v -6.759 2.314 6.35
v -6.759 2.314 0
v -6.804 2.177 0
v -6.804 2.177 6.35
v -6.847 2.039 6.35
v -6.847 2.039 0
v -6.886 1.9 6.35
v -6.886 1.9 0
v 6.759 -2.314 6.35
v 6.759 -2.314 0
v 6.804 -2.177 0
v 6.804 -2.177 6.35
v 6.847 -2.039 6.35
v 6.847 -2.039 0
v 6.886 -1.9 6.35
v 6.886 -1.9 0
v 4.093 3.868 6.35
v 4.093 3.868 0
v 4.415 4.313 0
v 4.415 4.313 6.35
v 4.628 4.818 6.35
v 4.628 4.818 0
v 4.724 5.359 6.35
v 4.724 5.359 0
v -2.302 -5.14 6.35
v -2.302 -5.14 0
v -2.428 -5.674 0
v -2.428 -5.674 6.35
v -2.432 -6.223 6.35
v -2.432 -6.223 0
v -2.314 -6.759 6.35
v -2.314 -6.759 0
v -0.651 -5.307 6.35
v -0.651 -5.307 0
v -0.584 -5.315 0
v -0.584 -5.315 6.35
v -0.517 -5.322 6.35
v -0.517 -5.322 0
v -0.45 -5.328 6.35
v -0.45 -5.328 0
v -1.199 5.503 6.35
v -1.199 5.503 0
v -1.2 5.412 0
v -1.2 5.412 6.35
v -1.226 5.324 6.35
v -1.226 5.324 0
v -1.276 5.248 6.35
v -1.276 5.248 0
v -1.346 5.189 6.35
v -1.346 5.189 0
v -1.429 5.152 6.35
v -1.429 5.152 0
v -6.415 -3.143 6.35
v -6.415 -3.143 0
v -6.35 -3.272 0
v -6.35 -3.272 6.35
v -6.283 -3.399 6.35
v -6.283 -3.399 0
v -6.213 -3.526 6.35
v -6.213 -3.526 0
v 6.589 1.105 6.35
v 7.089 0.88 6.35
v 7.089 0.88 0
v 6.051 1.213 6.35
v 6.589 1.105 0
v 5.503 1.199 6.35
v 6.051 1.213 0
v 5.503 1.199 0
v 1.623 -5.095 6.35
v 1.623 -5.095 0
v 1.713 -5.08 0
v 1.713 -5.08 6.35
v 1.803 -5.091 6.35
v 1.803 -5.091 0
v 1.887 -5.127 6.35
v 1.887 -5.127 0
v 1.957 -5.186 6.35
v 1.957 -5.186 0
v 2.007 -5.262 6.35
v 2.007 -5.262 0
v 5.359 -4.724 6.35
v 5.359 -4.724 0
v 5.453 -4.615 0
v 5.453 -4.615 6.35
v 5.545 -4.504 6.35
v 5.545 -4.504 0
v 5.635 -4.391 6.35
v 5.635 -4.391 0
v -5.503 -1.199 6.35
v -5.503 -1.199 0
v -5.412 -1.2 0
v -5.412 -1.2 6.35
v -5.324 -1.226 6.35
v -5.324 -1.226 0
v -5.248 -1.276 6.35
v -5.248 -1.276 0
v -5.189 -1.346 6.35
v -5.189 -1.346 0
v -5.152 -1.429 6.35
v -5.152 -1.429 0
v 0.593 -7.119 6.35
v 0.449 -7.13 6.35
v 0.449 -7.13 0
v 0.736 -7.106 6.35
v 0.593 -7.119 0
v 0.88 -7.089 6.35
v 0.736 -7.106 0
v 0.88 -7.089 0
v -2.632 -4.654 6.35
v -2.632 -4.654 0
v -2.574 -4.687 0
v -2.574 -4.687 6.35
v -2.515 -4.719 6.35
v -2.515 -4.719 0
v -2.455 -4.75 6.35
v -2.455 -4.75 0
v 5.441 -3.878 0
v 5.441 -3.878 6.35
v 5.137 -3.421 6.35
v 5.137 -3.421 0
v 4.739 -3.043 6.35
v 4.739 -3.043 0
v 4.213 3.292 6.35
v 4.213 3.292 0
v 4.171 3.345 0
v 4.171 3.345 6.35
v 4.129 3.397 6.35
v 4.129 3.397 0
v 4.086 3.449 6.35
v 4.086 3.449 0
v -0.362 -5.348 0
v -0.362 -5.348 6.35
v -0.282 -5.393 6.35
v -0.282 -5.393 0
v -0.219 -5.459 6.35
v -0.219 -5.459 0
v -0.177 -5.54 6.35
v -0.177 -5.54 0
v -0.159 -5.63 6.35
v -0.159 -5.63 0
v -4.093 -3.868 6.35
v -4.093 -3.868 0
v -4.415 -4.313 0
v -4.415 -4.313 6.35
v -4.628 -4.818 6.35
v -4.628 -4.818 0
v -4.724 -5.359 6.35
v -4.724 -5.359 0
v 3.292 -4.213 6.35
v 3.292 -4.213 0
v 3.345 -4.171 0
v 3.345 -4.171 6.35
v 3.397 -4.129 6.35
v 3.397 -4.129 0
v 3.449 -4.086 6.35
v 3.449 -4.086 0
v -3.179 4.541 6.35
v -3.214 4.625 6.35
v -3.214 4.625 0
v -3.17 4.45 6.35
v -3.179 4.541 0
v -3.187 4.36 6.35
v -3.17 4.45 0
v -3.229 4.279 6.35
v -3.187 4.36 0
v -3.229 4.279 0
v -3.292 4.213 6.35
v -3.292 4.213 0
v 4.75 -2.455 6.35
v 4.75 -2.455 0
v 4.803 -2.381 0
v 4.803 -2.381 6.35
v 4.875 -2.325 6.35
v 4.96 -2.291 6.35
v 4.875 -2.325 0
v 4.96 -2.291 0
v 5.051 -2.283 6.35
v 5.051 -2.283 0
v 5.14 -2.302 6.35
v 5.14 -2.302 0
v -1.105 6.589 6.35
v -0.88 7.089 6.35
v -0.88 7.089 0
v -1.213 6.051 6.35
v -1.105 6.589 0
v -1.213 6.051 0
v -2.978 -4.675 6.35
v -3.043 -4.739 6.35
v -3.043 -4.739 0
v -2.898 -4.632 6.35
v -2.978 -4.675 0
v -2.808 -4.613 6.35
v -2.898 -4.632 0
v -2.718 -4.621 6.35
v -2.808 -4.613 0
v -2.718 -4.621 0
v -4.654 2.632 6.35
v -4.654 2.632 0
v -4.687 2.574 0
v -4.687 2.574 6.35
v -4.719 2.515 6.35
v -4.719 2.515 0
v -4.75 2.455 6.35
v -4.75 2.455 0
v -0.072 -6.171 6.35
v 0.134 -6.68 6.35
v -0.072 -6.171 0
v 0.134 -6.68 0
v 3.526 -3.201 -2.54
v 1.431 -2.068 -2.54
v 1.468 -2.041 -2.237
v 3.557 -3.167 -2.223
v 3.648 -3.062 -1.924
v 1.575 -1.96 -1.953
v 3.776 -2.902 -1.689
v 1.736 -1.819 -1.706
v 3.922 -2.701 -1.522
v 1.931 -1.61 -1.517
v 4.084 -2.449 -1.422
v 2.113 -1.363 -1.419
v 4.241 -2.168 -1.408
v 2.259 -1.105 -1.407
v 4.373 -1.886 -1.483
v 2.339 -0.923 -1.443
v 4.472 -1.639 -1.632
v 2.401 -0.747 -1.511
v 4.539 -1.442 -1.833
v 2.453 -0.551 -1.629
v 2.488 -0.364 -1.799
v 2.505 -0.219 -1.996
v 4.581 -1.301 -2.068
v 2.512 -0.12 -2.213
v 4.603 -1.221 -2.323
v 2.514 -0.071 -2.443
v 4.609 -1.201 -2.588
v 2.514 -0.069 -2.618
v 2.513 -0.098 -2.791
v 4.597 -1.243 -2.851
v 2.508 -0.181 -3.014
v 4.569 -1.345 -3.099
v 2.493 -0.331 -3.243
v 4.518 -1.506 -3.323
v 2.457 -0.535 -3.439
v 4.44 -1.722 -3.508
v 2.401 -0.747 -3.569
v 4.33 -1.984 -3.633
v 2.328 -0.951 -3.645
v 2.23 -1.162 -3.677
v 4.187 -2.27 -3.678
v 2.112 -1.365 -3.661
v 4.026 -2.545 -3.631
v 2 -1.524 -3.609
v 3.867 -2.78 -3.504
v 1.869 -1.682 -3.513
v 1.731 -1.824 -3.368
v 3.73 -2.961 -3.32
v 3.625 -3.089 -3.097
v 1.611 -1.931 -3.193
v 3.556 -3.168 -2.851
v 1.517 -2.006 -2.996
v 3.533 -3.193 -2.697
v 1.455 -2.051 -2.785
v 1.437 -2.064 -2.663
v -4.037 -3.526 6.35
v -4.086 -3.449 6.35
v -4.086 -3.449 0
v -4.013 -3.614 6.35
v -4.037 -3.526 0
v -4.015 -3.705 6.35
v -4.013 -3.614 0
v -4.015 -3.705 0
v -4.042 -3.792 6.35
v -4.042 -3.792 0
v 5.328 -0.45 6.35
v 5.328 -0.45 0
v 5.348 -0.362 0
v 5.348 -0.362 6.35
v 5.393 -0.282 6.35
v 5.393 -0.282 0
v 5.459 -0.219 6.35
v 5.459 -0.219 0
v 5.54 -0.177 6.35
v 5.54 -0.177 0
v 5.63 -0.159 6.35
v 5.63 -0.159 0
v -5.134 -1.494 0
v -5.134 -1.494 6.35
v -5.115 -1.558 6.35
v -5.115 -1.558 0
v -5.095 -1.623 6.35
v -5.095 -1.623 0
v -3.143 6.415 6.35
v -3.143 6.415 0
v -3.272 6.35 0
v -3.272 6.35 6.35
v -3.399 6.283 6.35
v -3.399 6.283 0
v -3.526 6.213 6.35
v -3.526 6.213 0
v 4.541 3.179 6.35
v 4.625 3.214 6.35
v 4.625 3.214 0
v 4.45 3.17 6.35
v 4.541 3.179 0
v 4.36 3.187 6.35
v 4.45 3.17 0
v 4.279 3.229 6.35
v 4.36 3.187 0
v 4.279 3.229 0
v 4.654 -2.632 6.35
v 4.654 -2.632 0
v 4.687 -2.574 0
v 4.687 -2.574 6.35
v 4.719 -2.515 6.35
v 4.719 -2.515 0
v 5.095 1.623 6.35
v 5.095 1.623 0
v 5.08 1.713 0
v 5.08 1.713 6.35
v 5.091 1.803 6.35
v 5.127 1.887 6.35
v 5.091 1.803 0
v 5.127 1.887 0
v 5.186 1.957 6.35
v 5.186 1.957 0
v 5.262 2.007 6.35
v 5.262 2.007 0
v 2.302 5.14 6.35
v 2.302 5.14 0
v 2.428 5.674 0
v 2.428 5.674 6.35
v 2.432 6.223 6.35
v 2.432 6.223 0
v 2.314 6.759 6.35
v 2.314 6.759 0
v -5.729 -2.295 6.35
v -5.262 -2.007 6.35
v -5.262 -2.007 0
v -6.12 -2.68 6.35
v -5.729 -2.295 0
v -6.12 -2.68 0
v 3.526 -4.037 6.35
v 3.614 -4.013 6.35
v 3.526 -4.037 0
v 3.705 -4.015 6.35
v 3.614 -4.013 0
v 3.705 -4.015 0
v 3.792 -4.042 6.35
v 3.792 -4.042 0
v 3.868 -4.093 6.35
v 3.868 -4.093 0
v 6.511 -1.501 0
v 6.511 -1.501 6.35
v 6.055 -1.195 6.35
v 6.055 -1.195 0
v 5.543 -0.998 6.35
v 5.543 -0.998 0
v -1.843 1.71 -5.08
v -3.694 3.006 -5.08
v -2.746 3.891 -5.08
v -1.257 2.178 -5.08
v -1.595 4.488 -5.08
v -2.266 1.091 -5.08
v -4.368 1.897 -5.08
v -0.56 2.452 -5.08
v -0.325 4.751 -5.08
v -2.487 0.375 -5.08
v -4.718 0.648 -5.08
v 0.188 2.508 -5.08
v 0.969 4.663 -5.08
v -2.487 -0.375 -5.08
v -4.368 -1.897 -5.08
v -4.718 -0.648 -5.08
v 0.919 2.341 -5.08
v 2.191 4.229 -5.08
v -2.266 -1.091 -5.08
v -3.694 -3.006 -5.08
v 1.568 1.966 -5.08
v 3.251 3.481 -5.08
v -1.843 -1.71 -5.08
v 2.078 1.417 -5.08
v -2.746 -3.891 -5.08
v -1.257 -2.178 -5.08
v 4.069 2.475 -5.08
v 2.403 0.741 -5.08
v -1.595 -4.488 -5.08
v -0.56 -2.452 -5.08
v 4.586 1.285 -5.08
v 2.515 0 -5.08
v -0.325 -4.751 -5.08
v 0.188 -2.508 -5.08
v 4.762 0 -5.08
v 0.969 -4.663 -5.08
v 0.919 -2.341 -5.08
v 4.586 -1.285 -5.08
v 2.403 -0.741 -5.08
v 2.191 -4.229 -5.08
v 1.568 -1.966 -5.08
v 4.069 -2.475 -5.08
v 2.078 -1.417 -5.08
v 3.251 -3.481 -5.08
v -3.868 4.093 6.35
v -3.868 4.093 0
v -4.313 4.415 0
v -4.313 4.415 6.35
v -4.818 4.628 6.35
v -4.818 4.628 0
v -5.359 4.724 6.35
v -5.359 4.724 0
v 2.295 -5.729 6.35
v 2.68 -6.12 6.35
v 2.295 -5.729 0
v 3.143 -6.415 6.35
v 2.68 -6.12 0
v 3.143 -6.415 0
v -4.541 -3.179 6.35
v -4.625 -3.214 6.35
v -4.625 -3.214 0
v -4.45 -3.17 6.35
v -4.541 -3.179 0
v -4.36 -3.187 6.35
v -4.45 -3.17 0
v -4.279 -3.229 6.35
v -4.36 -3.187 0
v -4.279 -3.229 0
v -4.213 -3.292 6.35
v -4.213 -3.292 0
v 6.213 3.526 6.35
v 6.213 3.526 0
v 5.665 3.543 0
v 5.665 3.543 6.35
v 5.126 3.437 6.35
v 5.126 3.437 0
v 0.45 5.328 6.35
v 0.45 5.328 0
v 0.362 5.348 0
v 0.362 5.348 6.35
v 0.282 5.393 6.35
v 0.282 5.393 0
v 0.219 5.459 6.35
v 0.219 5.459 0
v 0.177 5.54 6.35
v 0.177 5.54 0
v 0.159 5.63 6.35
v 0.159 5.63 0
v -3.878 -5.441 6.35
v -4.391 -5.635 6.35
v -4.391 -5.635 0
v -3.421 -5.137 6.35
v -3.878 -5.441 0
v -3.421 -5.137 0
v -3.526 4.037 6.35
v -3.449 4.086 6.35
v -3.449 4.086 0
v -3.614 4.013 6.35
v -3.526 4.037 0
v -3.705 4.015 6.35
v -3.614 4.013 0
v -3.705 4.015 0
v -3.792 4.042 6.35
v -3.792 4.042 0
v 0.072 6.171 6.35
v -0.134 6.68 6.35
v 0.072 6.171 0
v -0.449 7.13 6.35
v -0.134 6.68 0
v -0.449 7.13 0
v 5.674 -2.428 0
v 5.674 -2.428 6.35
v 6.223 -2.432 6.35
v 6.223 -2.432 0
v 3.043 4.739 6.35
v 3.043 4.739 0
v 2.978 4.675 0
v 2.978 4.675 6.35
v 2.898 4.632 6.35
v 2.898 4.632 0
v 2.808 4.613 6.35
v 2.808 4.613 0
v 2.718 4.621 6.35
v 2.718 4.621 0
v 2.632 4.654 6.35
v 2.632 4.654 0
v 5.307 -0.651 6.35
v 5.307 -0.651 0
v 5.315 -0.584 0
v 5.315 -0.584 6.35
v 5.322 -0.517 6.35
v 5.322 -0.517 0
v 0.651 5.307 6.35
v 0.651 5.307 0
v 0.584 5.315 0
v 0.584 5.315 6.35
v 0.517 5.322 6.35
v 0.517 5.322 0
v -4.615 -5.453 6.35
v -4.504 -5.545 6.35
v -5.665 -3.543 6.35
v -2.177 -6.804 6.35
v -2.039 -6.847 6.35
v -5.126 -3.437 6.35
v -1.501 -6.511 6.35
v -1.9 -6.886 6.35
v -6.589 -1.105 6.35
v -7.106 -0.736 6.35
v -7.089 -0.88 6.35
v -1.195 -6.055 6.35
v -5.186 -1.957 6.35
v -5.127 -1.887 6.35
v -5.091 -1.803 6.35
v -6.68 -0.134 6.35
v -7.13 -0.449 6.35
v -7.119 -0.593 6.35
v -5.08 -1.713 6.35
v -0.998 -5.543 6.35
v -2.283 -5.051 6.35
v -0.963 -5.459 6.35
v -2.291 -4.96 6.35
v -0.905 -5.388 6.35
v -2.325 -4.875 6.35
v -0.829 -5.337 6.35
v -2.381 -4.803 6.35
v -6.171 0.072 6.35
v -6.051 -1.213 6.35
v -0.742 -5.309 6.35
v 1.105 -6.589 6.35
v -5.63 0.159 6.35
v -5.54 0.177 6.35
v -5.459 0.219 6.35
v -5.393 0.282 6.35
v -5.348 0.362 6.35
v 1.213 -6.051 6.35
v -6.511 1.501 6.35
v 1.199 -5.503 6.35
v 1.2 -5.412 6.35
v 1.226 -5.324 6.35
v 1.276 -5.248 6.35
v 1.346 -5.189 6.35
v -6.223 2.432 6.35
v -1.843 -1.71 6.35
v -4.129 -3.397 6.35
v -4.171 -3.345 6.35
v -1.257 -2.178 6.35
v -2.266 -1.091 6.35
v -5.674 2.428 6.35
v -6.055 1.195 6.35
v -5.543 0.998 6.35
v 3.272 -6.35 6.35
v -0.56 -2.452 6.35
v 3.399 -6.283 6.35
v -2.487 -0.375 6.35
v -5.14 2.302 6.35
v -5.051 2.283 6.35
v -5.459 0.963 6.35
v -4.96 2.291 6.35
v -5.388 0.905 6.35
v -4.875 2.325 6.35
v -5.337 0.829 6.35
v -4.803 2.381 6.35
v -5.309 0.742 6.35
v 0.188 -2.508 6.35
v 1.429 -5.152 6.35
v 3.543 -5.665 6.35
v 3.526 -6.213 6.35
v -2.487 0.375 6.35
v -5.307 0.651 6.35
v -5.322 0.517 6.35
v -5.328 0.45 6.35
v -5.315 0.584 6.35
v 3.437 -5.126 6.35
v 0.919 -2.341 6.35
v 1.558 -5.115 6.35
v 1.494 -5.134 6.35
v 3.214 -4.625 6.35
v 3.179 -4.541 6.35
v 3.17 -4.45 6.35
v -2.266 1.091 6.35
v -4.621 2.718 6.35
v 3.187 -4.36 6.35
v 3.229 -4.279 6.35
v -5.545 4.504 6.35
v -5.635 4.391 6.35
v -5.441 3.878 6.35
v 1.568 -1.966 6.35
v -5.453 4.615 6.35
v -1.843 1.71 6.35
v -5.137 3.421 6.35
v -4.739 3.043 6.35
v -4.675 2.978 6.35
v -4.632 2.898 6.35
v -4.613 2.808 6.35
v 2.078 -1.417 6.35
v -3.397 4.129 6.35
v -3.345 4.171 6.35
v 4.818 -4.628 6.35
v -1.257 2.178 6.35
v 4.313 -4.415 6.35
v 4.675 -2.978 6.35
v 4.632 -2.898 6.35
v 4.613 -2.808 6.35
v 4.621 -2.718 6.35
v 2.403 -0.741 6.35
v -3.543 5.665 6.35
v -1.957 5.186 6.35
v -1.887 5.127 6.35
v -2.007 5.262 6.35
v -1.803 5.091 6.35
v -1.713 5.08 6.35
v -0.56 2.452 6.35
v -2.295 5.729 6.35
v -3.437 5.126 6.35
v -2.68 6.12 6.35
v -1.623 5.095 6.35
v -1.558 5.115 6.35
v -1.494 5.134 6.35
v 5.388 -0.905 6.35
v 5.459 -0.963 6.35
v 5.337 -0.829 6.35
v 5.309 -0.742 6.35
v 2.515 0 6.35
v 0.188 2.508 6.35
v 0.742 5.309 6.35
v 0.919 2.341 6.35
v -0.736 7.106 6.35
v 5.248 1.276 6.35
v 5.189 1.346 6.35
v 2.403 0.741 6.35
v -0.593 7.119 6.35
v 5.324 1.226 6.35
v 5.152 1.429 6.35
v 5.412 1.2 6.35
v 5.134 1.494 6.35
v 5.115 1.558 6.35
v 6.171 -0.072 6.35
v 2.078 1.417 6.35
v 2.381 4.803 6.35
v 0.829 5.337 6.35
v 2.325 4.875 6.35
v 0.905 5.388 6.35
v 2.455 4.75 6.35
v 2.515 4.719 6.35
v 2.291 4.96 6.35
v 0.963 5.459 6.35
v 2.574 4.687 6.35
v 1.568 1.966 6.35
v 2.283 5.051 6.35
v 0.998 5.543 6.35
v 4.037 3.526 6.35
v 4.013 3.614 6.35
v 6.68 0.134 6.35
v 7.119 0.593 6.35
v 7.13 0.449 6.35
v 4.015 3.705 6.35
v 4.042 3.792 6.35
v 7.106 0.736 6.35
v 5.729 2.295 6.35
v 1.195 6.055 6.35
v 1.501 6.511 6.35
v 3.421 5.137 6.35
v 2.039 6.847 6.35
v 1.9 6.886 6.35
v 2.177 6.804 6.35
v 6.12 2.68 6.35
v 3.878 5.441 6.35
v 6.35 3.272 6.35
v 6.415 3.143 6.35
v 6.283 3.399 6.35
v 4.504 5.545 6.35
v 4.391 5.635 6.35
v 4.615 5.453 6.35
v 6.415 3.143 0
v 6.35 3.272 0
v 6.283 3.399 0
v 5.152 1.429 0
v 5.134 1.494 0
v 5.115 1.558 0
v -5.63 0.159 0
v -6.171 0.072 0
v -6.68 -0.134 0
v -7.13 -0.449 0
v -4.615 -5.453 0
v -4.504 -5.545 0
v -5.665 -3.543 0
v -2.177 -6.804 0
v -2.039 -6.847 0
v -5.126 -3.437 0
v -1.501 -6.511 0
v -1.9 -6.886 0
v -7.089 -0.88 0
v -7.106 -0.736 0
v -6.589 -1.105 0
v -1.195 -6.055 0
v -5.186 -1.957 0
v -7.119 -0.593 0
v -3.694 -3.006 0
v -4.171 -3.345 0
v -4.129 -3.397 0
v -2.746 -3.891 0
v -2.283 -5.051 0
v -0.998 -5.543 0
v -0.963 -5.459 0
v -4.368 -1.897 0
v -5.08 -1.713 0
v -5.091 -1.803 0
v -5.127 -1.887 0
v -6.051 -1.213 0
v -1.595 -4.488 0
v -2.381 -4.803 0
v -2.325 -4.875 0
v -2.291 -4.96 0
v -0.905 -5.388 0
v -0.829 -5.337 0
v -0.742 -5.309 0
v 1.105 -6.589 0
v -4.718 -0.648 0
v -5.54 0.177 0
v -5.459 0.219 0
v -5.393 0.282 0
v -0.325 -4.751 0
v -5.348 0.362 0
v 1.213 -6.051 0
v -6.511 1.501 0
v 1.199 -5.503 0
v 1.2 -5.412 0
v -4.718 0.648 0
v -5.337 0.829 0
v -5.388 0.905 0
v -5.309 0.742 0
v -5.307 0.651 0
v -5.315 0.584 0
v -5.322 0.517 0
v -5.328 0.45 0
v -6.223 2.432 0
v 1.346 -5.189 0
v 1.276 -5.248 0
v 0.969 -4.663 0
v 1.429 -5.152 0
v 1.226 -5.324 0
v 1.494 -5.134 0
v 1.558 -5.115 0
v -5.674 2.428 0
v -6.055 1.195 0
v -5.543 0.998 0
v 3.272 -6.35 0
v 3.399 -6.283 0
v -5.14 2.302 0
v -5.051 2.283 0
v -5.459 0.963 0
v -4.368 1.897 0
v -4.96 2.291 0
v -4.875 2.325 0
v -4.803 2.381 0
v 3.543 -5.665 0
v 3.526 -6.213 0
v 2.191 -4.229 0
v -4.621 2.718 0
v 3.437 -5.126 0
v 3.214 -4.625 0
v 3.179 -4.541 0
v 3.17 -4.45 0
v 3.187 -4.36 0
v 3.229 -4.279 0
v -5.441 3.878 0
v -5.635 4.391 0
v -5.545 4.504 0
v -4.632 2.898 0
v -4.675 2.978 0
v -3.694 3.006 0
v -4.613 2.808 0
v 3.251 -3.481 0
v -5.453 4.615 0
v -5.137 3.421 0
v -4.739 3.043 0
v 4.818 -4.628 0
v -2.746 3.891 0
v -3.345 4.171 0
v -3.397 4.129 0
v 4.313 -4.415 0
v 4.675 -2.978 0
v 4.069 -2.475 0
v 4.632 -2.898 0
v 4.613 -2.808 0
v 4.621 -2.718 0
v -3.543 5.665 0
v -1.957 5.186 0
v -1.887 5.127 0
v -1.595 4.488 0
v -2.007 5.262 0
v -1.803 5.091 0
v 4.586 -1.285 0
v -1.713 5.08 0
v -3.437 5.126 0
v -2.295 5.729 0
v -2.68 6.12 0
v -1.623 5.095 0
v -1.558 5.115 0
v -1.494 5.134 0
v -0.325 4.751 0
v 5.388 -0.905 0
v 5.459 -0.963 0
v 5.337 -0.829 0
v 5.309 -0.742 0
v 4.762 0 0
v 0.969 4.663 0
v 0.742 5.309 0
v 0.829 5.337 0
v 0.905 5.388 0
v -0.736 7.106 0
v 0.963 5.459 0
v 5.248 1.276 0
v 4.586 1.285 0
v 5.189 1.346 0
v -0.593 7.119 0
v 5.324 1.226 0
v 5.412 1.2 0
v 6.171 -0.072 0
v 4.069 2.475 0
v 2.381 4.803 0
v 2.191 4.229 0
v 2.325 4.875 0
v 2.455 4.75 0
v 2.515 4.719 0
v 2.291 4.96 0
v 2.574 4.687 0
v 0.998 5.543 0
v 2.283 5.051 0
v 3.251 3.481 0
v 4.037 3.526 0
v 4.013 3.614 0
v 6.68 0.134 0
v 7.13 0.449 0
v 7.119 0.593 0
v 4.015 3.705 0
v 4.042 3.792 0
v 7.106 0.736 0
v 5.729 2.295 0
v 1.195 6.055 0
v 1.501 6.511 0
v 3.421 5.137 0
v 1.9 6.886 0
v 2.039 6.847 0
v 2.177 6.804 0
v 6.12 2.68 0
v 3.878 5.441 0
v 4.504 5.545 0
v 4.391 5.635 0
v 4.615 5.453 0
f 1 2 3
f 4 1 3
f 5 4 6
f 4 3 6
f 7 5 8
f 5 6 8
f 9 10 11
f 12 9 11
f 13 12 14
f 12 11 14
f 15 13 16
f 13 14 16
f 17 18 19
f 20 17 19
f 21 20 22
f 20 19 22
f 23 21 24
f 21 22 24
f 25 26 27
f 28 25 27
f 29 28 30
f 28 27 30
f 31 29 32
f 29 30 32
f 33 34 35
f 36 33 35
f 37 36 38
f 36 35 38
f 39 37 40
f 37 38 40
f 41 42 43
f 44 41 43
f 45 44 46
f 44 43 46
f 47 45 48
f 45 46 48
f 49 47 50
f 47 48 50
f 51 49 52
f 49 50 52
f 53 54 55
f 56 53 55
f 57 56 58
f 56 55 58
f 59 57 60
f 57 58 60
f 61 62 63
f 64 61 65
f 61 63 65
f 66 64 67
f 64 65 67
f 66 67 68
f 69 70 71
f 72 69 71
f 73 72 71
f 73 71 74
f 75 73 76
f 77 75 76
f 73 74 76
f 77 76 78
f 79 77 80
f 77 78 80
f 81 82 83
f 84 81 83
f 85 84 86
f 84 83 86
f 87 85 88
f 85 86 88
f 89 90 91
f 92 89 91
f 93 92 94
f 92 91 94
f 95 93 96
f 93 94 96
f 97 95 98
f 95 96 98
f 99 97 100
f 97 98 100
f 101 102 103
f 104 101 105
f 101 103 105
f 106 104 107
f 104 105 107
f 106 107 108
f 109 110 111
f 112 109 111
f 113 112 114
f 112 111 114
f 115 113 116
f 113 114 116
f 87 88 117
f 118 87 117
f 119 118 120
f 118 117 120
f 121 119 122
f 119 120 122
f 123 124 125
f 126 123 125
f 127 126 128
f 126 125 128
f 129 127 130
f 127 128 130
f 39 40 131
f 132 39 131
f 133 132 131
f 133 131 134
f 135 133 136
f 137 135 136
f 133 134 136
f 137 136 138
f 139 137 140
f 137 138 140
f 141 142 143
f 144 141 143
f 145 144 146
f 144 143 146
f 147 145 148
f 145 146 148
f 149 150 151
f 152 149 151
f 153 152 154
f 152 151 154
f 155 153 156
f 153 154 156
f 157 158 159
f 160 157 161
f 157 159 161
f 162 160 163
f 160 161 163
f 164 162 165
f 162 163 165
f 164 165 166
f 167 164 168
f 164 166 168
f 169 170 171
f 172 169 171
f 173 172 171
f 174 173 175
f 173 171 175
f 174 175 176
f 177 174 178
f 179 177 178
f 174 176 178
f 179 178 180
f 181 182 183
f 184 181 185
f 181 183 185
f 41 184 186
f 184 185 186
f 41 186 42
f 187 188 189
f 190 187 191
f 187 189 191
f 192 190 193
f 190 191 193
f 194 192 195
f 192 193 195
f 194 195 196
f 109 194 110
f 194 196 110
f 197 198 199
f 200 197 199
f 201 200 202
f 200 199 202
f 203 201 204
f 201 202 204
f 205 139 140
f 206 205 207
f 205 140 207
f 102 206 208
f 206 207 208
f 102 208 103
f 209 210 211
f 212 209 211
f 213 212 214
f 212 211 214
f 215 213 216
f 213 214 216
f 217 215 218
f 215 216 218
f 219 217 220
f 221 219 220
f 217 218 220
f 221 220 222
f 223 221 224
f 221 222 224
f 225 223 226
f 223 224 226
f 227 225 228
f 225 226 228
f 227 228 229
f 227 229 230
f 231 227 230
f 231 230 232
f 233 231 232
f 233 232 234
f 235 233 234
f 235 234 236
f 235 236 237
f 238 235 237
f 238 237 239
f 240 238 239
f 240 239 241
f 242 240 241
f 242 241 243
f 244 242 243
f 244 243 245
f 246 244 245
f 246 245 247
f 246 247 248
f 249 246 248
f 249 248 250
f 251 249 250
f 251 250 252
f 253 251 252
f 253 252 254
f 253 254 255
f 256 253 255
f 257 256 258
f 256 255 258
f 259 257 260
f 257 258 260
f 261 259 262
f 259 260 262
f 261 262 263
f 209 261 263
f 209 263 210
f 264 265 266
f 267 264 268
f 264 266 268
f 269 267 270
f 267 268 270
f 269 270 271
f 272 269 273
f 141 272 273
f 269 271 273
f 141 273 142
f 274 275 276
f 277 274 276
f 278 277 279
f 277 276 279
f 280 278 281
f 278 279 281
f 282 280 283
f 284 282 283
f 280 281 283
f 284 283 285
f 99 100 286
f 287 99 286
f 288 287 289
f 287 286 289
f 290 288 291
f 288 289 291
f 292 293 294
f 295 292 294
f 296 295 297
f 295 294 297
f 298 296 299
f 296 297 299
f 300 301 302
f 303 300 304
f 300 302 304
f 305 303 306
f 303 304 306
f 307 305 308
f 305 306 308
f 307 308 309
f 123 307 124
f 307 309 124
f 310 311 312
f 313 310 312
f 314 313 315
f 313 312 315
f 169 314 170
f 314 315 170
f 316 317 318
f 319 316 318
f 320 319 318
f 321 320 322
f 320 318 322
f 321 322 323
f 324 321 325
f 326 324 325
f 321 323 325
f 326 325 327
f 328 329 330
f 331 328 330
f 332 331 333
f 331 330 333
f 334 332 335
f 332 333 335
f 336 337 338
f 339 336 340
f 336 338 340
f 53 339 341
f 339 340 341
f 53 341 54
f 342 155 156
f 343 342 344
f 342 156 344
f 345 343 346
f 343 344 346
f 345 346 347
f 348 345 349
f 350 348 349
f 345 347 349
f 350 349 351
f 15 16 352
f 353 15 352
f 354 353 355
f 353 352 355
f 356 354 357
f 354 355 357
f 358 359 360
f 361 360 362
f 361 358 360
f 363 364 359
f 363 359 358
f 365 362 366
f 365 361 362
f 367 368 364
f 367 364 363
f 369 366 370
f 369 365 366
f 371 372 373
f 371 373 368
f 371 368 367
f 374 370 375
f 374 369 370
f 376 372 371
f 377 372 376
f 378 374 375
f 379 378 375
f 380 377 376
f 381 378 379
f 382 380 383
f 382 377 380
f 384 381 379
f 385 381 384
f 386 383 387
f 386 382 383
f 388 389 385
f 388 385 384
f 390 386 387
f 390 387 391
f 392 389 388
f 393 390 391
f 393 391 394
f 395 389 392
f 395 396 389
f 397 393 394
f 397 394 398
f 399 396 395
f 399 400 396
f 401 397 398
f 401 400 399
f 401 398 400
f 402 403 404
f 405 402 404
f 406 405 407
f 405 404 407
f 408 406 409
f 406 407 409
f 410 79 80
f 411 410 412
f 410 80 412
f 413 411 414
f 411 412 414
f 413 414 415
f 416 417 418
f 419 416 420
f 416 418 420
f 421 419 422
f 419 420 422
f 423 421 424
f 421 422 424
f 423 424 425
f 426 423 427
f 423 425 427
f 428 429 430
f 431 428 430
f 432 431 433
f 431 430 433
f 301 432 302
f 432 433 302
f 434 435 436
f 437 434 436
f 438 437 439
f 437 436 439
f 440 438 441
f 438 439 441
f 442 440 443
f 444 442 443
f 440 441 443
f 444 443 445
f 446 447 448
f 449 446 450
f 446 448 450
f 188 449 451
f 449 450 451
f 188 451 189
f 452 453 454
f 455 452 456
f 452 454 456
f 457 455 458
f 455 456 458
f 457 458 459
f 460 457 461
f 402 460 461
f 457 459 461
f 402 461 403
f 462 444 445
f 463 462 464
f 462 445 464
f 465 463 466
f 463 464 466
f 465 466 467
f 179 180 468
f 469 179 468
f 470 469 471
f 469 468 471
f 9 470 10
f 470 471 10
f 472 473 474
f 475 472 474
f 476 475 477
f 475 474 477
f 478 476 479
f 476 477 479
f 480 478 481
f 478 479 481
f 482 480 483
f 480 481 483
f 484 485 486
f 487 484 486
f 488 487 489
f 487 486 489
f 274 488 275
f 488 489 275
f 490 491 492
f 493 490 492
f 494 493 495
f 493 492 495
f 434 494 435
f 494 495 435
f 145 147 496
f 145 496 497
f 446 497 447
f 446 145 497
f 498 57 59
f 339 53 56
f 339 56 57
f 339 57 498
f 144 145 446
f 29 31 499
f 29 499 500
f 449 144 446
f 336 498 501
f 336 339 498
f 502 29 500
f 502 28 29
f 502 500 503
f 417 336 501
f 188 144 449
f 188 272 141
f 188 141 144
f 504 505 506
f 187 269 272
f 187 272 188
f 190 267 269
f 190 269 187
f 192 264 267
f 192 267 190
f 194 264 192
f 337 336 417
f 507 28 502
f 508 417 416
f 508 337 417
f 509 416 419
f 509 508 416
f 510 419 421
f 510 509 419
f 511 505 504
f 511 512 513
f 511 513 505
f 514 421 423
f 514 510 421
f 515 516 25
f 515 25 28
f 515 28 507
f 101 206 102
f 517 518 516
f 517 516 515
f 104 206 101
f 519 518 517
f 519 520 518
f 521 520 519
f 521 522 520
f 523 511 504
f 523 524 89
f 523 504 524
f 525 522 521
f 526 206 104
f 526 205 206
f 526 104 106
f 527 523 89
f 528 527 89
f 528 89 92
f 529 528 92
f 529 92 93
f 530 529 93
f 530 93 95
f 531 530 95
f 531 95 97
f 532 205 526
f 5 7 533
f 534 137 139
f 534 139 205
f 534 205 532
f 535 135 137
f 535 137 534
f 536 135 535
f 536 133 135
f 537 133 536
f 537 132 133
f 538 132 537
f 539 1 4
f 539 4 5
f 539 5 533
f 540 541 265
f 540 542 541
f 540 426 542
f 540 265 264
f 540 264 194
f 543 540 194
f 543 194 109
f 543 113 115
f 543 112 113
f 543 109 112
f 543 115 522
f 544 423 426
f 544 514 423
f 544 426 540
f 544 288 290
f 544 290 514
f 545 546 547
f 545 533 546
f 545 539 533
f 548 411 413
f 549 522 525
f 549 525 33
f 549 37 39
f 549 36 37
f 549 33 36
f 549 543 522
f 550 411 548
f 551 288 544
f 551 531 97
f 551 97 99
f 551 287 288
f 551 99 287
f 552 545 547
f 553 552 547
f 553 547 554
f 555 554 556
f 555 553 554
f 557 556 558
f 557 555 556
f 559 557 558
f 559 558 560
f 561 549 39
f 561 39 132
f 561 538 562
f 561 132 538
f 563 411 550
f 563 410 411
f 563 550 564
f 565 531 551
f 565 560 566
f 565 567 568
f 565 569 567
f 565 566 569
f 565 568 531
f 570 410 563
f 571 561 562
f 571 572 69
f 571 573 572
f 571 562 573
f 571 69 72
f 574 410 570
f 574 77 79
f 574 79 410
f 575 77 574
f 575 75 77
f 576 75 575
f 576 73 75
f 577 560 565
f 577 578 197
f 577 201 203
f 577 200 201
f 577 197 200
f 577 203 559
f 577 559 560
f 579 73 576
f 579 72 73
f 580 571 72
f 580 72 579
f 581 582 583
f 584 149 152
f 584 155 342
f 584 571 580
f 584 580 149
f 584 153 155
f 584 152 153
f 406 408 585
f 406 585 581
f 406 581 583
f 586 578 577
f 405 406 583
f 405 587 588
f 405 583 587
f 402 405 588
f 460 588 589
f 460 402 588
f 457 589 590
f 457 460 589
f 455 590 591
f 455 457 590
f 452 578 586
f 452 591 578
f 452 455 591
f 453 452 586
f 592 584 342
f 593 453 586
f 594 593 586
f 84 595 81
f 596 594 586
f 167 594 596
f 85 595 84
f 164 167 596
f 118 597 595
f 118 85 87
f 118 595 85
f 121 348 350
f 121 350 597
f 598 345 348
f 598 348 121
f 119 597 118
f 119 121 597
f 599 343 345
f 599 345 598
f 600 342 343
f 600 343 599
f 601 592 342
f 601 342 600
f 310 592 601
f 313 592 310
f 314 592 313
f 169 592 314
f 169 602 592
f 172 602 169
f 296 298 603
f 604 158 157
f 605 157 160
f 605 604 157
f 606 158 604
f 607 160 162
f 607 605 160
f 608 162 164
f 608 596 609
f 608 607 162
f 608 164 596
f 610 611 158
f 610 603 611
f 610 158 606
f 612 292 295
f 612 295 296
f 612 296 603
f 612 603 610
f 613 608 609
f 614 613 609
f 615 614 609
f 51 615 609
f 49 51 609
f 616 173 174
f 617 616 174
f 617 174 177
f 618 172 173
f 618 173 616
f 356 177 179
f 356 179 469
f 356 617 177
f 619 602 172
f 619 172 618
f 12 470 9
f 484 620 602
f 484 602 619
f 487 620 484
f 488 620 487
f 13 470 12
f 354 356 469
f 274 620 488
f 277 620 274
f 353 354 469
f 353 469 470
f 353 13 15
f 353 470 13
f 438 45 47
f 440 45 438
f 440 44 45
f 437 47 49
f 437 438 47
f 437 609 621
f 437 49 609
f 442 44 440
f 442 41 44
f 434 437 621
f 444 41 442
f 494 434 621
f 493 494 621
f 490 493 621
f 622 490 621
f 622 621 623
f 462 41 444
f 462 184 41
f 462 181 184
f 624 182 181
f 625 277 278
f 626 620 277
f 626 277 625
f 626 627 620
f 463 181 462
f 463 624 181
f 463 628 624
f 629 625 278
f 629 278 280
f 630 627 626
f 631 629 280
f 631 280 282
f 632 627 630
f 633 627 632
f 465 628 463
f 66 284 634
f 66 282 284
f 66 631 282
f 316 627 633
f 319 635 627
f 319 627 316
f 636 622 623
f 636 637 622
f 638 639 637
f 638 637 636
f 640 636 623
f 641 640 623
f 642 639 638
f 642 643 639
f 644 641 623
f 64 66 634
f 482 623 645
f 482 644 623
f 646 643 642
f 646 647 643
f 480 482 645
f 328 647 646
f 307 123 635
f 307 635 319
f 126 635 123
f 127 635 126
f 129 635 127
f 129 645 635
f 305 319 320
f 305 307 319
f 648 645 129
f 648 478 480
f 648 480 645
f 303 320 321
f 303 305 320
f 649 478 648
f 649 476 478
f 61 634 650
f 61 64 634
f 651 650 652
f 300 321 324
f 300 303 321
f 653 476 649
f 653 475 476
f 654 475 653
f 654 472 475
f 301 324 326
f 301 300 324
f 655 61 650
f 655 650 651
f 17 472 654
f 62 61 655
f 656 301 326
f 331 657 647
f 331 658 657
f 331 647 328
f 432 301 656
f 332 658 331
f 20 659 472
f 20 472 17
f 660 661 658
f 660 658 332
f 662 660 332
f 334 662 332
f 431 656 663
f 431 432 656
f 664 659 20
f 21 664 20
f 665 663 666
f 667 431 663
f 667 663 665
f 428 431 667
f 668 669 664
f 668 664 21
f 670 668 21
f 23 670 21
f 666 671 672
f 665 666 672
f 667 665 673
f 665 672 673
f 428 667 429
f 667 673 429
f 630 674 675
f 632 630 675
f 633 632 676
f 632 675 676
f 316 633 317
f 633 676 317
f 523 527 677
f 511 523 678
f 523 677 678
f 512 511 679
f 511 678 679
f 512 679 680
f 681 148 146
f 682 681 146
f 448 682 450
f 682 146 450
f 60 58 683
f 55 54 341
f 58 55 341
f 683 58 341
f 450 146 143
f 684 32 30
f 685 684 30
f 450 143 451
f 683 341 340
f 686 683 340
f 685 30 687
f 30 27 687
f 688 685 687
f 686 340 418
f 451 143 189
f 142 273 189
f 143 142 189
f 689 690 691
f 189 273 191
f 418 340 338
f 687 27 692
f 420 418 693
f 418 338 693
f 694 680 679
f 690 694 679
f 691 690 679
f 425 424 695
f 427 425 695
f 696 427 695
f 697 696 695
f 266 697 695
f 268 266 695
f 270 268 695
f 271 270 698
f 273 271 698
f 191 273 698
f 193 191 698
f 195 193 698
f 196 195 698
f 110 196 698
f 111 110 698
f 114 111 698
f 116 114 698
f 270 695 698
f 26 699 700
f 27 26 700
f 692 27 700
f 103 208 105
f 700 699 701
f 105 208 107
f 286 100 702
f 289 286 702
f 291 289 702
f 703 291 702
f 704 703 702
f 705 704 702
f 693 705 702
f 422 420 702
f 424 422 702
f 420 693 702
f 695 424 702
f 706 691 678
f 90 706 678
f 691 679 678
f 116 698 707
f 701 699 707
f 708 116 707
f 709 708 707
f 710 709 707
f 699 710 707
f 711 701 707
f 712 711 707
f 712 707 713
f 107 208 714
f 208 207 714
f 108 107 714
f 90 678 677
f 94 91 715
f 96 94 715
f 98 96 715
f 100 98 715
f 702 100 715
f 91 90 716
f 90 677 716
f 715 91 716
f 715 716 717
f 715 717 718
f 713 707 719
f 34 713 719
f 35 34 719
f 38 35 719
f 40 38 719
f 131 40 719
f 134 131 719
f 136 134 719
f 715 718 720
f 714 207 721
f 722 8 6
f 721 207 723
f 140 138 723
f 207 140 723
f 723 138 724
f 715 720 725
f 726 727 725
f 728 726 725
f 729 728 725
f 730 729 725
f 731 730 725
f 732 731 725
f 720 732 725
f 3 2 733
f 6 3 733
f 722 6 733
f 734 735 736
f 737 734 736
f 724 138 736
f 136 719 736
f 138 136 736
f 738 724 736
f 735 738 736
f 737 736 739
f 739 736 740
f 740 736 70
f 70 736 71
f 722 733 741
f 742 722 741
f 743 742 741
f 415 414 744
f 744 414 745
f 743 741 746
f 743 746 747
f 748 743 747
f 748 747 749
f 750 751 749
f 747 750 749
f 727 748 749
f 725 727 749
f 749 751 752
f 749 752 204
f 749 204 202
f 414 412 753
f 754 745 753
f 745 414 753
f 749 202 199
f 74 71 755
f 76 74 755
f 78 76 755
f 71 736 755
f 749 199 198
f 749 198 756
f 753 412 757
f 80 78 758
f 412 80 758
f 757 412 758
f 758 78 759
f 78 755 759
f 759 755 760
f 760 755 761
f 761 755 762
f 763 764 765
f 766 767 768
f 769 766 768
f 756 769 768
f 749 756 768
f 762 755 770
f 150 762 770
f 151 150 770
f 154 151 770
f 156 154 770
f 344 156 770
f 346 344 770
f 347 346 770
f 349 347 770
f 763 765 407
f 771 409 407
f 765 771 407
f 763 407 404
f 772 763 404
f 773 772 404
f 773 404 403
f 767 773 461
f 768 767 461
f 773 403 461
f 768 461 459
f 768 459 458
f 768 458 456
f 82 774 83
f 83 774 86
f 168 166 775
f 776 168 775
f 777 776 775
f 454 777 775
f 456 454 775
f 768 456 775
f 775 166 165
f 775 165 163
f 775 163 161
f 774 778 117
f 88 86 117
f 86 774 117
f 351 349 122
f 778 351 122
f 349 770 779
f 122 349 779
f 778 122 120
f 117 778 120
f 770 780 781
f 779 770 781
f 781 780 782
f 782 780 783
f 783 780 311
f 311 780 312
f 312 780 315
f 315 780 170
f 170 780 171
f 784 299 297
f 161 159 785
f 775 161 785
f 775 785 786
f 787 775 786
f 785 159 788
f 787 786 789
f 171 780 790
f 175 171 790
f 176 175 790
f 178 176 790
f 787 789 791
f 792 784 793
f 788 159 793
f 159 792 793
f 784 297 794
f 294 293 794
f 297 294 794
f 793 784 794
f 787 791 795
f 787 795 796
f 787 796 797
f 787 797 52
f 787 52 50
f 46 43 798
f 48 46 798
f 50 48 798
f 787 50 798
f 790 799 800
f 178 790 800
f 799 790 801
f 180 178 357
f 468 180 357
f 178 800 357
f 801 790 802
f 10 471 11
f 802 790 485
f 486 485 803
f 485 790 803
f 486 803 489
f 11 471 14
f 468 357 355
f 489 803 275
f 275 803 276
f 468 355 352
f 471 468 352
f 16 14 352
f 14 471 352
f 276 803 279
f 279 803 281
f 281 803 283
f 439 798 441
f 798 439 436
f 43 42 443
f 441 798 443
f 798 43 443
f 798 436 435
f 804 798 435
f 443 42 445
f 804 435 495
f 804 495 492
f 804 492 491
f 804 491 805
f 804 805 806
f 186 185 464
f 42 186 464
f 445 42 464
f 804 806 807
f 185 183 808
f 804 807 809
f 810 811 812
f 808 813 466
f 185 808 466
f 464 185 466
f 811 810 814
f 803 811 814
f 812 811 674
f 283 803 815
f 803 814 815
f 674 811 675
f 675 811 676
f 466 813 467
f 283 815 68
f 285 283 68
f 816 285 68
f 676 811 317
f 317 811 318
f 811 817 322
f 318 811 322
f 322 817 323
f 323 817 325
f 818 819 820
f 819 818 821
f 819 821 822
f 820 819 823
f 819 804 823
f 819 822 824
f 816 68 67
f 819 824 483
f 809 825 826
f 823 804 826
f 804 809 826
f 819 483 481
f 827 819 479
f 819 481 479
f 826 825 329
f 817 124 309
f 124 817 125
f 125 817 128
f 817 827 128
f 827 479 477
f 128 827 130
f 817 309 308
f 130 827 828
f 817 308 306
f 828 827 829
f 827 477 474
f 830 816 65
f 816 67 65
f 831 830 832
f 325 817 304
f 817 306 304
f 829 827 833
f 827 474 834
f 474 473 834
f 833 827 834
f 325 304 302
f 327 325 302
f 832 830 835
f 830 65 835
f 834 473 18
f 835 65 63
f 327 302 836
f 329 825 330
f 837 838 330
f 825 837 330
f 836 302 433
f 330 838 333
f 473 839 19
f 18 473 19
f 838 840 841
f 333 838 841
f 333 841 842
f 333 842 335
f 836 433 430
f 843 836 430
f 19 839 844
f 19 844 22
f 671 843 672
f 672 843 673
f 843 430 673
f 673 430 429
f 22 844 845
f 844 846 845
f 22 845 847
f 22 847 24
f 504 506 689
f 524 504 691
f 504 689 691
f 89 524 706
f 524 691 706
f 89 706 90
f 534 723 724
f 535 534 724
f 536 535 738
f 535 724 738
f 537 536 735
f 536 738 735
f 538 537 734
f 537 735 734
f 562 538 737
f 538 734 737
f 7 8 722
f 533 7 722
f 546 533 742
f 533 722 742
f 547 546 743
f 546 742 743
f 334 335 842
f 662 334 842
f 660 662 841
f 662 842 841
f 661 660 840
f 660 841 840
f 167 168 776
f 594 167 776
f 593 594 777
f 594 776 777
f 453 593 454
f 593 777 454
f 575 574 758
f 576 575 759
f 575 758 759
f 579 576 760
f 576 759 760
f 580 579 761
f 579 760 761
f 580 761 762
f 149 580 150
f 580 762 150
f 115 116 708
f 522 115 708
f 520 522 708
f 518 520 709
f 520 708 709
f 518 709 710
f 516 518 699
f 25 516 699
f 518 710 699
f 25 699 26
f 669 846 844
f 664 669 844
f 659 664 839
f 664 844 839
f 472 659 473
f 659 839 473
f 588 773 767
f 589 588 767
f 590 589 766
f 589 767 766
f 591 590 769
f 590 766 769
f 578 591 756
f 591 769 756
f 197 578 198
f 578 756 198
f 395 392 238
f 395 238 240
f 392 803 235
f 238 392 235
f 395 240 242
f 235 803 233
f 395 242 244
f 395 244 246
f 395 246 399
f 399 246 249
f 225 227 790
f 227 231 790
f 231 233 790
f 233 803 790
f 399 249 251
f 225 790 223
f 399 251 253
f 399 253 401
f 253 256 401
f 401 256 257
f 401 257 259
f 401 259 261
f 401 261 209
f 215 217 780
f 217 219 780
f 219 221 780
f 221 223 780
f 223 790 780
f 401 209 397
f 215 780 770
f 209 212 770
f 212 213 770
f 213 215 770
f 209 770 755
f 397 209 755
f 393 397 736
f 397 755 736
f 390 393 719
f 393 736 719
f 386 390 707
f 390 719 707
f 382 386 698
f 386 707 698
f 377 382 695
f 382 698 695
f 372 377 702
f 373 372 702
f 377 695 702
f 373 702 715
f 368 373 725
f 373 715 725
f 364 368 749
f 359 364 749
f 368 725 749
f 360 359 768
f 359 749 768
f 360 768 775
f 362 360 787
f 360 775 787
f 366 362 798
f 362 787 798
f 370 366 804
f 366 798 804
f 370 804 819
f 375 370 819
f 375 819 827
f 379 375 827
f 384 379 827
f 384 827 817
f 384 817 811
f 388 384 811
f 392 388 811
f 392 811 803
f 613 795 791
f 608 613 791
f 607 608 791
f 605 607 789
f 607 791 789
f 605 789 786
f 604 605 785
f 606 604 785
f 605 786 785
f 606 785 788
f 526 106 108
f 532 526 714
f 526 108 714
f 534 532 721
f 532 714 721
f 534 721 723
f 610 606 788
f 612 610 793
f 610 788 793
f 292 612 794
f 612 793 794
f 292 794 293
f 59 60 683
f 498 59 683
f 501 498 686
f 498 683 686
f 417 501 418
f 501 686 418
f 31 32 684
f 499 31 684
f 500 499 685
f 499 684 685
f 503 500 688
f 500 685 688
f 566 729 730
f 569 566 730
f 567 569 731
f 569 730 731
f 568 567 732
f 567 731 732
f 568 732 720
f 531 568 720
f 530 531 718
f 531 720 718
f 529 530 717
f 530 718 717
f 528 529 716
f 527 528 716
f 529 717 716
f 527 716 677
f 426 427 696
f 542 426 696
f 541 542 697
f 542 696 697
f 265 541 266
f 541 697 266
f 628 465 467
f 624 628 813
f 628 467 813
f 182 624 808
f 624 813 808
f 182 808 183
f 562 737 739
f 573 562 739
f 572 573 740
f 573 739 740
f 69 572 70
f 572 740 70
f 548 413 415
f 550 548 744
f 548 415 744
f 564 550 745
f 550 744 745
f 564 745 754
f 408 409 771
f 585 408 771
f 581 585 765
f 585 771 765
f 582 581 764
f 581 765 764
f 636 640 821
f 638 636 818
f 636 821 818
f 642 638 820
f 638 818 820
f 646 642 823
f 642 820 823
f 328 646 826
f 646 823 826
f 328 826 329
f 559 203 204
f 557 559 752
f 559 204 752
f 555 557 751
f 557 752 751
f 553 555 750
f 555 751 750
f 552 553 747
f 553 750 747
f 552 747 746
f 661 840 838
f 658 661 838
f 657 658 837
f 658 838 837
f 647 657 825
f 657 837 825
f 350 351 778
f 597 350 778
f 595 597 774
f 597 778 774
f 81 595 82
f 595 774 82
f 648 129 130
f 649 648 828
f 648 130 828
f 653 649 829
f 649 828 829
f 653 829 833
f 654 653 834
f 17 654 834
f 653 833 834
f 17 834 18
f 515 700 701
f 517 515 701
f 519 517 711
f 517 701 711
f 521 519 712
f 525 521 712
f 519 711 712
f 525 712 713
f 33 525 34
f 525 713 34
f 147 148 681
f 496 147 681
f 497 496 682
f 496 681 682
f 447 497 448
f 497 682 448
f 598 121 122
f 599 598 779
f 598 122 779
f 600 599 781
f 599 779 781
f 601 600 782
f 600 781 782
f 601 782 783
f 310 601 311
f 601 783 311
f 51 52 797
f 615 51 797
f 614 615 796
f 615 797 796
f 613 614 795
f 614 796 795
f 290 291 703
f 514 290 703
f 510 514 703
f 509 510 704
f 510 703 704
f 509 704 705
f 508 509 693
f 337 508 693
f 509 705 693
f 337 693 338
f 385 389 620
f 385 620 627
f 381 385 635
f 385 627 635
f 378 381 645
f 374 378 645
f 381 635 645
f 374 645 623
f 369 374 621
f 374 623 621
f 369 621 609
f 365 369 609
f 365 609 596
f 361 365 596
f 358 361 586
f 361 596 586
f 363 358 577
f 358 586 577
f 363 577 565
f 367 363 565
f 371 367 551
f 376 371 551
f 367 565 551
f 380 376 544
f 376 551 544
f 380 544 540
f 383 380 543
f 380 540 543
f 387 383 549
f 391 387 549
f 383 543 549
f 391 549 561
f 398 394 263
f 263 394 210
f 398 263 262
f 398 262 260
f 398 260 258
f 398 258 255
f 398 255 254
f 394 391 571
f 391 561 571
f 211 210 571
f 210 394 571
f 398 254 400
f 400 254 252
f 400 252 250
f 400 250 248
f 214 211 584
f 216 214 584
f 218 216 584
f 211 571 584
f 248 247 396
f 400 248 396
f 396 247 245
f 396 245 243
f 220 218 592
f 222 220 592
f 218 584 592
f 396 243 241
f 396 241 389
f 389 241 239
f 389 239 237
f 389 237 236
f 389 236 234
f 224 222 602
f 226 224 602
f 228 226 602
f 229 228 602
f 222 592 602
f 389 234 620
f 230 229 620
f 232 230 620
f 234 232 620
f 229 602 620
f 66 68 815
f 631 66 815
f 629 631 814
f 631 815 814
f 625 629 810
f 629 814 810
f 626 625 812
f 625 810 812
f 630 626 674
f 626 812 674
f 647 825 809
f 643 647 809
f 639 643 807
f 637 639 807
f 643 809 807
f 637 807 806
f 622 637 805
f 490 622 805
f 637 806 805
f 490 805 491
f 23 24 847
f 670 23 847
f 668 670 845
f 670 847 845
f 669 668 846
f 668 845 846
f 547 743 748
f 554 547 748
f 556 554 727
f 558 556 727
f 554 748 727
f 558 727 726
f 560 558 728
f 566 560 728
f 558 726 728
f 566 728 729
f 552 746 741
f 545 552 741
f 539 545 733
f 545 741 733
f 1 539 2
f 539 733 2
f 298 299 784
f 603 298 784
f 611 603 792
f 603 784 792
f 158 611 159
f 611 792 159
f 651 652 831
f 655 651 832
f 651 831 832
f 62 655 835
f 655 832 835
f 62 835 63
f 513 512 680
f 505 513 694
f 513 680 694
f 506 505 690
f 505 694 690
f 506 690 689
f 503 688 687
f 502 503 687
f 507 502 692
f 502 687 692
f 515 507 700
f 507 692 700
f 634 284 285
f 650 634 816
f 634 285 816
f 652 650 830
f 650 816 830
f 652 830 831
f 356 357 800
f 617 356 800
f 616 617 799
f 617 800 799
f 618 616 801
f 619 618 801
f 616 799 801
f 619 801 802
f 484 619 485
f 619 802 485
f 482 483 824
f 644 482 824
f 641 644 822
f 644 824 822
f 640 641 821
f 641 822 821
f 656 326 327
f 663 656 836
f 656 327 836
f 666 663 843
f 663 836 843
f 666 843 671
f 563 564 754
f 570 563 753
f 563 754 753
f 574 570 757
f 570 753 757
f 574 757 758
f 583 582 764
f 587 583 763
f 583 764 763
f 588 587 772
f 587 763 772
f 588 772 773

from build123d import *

# Parameters (mm, degrees)
SKETCH3_R         = 7.14375
GEARBODY_DEPTH    = 6.35
TOOTHCUT_DEPTH    = 12.932679
CIRPATTERN1_COUNT = 16
HUB1DIA_R         = 4.7625
HUB1_DEPTH        = 5.080000076
BOREDIA_R         = 2.514599986
BORE_DEPTH        = 12700
SS1HUB1_D         = 2.27584
SS1HUB1_DEPTH     = 4.7625
SS1HUB1_TIP       = 0.683731316


with BuildPart() as part:
    # Sketch3 → gearBody (new body)
    with BuildSketch(Plane.XY):
        Circle(SKETCH3_R)
    extrude(amount=GEARBODY_DEPTH)

    # Sketch2 → toothCut (cut, through all)
    with BuildSketch(Plane.XY):
        with BuildLine():
            ThreePointArc((5.306900665, -0.651157603), (5.318245312, -0.550879014), (5.327695278, -0.450404168))
            ThreePointArc((5.327695278, -0.450404168), (5.423940856, -0.248073769), (5.629653426, -0.159286719))
            ThreePointArc((5.629653426, -0.159286719), (6.706703242, 0.149132804), (7.533202253, 0.905478157))
            ThreePointArc((7.533202253, 0.905478157), (7.547045935, -0.781744537), (7.187671981, -2.430308285))
            ThreePointArc((7.187671981, -2.430308285), (6.533745871, -1.520616276), (5.542778599, -0.997985647))
            ThreePointArc((5.542778599, -0.997985647), (5.359631891, -0.868919444), (5.306900665, -0.651157603))
        make_face()
    toothcut = extrude(amount=TOOTHCUT_DEPTH, mode=Mode.SUBTRACT)

    # CirPattern1: toothCut ×16 about axis
    cirpattern1_axis = Axis((0, 0, 6.35), (0, 0, -1))
    for i in range(1, CIRPATTERN1_COUNT):
        add(toothcut.rotate(cirpattern1_axis, i * 360 / CIRPATTERN1_COUNT), mode=Mode.SUBTRACT)

    # hub1Dia → hub1 (add)
    with BuildSketch(Plane(origin=(0, 0, 0), x_dir=(-1, 0, 0), z_dir=(0, 0, -1))):
        Circle(HUB1DIA_R)
    extrude(amount=HUB1_DEPTH)

    # boreDia → bore (cut, symmetric)
    with BuildSketch(Plane.XY):
        Circle(BOREDIA_R)
    extrude(amount=BORE_DEPTH, both=True, mode=Mode.SUBTRACT)

    # ss1Hub1
    with Locations(Plane(origin=(4.188781818, -2.266167057, -2.540000038), x_dir=(0.475835602514, 0.879534240027, 0), z_dir=(0.879534240027, -0.475835602514, 0))):
        with Locations((0, 0)):
            Hole(SS1HUB1_D / 2, depth=SS1HUB1_DEPTH)
            with Locations((0, 0, -(SS1HUB1_DEPTH + SS1HUB1_TIP / 2))):  # 118° drill point
                Cone(0, SS1HUB1_D / 2, SS1HUB1_TIP, mode=Mode.SUBTRACT)


solid = part.part
